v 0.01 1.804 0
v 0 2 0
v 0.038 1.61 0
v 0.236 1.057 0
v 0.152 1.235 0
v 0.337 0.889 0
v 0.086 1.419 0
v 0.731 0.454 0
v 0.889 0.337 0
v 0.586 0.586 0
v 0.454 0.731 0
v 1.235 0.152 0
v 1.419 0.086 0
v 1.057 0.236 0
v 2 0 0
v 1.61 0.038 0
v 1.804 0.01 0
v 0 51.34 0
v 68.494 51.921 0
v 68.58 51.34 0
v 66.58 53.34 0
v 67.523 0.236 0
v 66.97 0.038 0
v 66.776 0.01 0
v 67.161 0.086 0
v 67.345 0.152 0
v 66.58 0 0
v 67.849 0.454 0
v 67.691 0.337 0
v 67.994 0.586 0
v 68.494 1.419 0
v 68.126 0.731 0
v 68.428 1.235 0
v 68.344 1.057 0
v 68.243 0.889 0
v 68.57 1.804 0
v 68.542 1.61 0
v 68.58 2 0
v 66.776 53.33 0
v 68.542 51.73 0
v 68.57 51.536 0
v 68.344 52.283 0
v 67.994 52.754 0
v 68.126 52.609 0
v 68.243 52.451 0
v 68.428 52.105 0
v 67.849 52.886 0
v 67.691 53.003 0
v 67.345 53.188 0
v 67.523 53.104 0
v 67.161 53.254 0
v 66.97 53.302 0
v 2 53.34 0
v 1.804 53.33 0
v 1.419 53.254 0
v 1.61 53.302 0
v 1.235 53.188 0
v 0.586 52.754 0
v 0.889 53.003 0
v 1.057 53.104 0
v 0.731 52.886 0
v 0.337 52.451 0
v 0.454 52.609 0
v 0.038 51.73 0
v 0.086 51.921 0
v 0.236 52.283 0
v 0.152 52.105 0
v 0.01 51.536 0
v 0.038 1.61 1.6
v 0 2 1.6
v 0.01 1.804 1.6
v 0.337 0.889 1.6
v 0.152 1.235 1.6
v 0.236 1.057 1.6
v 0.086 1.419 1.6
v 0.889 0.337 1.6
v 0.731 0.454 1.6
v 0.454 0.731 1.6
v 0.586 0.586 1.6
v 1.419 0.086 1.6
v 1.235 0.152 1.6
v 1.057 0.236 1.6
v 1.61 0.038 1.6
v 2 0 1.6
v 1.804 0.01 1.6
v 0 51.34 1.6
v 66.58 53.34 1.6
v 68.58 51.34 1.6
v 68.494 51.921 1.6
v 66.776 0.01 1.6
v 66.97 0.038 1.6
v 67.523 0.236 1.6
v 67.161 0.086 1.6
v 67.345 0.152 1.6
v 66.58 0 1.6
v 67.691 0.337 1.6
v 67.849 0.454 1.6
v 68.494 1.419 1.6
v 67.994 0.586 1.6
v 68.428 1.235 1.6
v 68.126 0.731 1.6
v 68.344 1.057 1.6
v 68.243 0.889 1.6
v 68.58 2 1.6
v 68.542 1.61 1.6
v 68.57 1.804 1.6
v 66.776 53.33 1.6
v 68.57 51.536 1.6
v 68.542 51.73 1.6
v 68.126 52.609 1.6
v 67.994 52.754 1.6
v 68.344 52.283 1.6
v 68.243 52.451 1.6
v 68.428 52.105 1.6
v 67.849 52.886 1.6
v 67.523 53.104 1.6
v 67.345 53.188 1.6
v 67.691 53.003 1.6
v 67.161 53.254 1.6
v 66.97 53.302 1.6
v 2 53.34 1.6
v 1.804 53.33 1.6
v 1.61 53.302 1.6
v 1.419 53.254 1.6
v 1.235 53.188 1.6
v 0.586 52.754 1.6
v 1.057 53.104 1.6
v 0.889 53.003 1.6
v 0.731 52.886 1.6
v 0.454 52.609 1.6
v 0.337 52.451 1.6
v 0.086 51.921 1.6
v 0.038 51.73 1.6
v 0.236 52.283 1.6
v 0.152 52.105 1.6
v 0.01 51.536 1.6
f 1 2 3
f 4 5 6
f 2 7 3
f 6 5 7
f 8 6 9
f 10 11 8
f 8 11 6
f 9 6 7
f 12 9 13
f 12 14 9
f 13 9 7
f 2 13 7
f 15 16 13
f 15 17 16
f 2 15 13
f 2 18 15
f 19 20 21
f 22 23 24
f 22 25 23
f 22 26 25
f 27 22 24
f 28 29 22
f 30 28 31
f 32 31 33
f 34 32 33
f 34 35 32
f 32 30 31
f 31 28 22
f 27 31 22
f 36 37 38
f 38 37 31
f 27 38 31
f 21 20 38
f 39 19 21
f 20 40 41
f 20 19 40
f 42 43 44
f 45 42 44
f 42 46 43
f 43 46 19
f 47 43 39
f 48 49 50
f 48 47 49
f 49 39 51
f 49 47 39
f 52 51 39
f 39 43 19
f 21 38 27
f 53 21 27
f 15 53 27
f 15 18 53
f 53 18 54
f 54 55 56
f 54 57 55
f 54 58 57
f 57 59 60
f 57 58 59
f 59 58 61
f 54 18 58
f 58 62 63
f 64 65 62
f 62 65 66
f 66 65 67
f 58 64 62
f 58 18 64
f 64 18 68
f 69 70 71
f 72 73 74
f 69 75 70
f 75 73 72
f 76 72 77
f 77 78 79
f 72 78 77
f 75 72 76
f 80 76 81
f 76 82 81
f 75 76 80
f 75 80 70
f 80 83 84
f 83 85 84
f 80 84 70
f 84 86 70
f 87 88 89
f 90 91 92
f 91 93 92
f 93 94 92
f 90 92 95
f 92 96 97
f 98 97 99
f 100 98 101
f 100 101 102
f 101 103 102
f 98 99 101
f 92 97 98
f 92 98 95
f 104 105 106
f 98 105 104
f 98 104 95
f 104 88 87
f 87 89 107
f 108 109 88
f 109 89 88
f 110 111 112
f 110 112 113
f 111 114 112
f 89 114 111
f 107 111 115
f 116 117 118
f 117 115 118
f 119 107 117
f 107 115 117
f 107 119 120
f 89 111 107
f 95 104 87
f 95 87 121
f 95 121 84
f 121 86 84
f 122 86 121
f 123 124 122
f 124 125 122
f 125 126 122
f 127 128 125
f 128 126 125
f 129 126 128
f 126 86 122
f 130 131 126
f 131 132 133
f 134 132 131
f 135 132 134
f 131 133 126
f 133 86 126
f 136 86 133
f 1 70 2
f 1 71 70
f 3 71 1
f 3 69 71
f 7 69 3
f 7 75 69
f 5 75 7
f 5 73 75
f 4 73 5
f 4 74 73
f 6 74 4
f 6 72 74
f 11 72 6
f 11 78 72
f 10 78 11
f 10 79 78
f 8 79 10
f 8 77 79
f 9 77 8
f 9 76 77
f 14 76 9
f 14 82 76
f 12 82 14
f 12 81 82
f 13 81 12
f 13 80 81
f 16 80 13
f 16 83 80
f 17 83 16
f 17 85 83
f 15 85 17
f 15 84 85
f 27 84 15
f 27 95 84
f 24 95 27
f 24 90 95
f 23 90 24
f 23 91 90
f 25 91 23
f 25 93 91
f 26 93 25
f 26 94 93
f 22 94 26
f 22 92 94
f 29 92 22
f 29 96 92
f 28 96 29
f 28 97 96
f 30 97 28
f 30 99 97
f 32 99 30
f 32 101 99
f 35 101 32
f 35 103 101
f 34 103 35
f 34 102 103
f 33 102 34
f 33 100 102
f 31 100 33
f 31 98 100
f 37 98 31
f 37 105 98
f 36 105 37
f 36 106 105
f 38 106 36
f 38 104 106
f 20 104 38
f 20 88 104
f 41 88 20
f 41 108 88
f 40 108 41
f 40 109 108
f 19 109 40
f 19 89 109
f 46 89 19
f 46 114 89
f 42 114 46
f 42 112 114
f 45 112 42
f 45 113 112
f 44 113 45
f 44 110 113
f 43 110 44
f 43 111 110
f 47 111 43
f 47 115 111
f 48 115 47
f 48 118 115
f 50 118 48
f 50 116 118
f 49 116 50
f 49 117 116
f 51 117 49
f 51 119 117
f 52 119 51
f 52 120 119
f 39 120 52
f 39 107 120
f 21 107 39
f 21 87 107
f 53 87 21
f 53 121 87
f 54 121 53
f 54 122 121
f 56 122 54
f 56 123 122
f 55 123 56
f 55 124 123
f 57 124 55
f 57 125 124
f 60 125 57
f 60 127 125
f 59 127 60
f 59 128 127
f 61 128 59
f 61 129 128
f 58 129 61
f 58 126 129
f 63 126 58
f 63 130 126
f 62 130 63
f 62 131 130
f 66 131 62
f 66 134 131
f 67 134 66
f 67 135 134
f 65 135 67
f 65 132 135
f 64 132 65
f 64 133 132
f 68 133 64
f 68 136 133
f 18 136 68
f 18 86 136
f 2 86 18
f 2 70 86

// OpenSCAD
$fn = 64;

board_len = 68.58;
board_wid = 53.34;
board_thk = 1.6;

corner_r = 2.0;

module rounded_rect_2d(l, w, r){
    r2 = min(r, min(l, w)/2);
    hull(){
        translate([ r2,      r2     ]) circle(r=r2);
        translate([ l - r2,  r2     ]) circle(r=r2);
        translate([ r2,      w - r2 ]) circle(r=r2);
        translate([ l - r2,  w - r2 ]) circle(r=r2);
    }
}

linear_extrude(height=board_thk)
    rounded_rect_2d(board_len, board_wid, corner_r);
